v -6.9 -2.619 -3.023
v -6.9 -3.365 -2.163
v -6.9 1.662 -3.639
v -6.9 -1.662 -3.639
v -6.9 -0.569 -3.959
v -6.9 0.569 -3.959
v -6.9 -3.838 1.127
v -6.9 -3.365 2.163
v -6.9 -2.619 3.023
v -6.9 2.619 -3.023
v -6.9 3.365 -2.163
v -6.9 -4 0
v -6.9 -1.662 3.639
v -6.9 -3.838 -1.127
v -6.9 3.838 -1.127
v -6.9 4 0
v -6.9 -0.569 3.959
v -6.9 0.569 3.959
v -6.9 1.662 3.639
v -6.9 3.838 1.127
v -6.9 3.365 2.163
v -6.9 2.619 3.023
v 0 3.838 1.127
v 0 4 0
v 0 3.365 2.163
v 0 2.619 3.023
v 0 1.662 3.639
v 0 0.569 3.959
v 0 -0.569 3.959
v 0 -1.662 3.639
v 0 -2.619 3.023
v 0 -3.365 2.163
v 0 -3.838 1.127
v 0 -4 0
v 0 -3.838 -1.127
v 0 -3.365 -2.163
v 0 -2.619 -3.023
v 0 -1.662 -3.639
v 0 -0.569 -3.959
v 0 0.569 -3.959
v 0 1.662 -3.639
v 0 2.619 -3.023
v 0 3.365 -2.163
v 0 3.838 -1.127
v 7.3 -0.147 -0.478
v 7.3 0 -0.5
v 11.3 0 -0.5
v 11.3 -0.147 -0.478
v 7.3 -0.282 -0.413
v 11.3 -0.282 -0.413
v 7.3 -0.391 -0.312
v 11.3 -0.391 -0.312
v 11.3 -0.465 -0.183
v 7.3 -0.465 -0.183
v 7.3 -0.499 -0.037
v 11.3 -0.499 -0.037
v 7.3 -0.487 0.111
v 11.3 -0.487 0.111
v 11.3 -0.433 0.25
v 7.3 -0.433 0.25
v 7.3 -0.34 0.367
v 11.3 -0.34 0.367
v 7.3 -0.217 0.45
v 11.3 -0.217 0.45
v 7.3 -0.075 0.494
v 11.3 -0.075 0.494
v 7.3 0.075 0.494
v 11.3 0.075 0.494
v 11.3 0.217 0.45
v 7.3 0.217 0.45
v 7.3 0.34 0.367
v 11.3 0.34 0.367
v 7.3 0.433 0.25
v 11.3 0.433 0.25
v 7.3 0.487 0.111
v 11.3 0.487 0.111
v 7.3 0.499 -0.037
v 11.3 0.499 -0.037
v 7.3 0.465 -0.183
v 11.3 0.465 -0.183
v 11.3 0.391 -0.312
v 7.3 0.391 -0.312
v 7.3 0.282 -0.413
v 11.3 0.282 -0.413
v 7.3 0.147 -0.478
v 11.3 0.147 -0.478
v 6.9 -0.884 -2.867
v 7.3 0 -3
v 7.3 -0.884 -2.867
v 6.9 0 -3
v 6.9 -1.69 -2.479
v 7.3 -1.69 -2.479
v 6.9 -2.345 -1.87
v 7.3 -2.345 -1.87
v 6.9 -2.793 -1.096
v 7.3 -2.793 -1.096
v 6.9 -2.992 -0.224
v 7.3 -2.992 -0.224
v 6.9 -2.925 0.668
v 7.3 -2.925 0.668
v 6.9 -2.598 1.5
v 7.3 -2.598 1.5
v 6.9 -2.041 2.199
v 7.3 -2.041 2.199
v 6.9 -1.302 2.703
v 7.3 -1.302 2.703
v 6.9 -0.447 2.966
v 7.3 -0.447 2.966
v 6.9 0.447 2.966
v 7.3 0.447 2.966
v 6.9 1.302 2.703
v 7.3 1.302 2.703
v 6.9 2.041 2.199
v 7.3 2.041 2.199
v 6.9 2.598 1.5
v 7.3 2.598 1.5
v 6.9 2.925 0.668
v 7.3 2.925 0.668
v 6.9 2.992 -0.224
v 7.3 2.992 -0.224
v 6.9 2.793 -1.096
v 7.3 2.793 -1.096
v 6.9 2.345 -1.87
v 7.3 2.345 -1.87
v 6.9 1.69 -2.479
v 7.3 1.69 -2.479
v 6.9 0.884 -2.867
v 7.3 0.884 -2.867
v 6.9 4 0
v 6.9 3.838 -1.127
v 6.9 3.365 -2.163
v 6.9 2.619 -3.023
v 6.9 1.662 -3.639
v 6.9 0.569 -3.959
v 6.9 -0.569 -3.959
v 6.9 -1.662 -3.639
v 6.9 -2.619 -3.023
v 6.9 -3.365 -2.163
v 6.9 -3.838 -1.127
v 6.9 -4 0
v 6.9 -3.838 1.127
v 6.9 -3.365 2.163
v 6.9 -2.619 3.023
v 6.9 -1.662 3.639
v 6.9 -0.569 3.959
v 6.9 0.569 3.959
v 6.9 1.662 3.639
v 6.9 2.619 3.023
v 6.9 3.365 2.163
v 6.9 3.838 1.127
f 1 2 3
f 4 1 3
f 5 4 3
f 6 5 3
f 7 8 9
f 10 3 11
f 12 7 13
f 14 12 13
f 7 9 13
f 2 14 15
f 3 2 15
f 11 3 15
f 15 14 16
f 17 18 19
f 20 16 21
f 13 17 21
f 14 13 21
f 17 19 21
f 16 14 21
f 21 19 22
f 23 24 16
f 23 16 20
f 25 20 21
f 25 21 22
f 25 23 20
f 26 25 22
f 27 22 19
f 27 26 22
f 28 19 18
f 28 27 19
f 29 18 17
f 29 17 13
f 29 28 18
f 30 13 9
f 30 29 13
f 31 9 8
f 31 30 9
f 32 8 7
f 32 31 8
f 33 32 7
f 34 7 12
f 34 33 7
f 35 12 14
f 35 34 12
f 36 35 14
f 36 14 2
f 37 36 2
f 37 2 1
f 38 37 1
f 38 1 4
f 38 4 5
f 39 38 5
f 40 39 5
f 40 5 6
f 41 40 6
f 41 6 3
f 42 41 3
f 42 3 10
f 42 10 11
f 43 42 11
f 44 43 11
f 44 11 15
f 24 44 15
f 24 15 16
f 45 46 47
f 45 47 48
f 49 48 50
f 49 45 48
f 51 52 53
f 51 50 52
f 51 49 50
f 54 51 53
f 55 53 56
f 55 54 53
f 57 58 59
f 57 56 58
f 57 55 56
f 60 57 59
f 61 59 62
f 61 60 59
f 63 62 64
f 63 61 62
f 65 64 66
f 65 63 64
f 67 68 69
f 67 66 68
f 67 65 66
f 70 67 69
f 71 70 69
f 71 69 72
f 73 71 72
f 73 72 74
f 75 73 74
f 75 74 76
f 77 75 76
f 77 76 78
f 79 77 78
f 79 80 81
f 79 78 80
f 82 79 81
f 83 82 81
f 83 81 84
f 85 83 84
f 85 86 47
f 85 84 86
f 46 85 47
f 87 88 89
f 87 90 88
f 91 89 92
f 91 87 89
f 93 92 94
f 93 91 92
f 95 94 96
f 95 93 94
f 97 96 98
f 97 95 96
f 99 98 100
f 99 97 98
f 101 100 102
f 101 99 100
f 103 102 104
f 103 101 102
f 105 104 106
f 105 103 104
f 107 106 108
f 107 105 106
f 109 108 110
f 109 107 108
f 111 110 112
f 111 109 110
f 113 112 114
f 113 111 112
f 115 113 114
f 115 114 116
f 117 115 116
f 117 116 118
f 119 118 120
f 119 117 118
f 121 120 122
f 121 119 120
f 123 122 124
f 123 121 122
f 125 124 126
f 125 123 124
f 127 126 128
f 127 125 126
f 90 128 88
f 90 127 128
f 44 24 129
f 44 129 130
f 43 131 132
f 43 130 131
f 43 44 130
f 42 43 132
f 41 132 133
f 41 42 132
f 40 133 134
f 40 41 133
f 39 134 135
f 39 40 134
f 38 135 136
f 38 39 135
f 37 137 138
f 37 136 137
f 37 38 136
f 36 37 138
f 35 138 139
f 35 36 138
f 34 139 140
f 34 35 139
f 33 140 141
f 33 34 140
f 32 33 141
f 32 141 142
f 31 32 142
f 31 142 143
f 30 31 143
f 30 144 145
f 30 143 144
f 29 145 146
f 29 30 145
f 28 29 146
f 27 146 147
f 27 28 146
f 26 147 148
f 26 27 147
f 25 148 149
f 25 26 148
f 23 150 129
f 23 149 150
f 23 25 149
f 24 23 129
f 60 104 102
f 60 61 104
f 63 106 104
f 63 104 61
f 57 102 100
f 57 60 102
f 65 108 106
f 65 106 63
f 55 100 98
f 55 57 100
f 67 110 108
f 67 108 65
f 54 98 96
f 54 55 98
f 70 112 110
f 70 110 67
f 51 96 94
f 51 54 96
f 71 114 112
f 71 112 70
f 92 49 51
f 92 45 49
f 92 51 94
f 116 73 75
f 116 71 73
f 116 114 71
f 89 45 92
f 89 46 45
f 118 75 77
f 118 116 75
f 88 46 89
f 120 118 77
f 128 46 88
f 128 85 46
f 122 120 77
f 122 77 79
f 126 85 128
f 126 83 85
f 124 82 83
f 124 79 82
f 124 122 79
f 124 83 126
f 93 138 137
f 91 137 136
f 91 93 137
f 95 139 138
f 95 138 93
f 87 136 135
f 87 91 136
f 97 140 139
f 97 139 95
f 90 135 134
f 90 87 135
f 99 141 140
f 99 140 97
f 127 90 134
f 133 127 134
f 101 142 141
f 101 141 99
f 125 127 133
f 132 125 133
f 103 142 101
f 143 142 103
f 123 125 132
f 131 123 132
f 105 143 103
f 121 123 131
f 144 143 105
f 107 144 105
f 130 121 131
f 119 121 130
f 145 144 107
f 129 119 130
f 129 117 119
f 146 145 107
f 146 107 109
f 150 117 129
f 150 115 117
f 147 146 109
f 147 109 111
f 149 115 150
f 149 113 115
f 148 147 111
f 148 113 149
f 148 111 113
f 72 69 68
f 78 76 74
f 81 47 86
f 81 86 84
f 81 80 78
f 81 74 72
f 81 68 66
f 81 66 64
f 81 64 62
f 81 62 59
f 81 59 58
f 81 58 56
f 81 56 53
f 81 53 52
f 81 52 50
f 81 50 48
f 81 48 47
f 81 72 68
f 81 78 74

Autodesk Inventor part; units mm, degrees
ref_plane "YZ Plane" through (0, 0, 0) normal (1, 0, 0) x (0, 1, 0)
ref_plane "XZ Plane" through (0, 0, 0) normal (0, 1, 0) x (-1, 0, 0)
ref_plane "XY Plane" through (0, 0, 0) normal (0, 0, 1) x (1, 0, 0)
sketch "Sketch1" plane through (0, 0, 0) normal (1, 0, 0) x (0, 1, 0)
  circle A0 centre (0, 0) radius 4
  dimension "d0" = 8
extrude "Extrusion1" add sketch "Sketch1" along normal mid plane 13.8
sketch "Sketch2" plane through (6.9, 0, 0) normal (1, 0, 0) x (0, 0, -1)
  circle A0 centre (0, 0) radius 3
  dimension "d3" = 6
extrude "Extrusion2" add sketch "Sketch2" along normal blind 0.4
sketch "Sketch3" plane through (7.3, 0, 0) normal (1, 0, 0) x (0, 0, -1)
  circle A0 centre (0, 0) radius 0.5
  dimension "d6" = 1
extrude "Extrusion3" add sketch "Sketch3" along normal blind 4
properties part number "AM0820 Stepper"
